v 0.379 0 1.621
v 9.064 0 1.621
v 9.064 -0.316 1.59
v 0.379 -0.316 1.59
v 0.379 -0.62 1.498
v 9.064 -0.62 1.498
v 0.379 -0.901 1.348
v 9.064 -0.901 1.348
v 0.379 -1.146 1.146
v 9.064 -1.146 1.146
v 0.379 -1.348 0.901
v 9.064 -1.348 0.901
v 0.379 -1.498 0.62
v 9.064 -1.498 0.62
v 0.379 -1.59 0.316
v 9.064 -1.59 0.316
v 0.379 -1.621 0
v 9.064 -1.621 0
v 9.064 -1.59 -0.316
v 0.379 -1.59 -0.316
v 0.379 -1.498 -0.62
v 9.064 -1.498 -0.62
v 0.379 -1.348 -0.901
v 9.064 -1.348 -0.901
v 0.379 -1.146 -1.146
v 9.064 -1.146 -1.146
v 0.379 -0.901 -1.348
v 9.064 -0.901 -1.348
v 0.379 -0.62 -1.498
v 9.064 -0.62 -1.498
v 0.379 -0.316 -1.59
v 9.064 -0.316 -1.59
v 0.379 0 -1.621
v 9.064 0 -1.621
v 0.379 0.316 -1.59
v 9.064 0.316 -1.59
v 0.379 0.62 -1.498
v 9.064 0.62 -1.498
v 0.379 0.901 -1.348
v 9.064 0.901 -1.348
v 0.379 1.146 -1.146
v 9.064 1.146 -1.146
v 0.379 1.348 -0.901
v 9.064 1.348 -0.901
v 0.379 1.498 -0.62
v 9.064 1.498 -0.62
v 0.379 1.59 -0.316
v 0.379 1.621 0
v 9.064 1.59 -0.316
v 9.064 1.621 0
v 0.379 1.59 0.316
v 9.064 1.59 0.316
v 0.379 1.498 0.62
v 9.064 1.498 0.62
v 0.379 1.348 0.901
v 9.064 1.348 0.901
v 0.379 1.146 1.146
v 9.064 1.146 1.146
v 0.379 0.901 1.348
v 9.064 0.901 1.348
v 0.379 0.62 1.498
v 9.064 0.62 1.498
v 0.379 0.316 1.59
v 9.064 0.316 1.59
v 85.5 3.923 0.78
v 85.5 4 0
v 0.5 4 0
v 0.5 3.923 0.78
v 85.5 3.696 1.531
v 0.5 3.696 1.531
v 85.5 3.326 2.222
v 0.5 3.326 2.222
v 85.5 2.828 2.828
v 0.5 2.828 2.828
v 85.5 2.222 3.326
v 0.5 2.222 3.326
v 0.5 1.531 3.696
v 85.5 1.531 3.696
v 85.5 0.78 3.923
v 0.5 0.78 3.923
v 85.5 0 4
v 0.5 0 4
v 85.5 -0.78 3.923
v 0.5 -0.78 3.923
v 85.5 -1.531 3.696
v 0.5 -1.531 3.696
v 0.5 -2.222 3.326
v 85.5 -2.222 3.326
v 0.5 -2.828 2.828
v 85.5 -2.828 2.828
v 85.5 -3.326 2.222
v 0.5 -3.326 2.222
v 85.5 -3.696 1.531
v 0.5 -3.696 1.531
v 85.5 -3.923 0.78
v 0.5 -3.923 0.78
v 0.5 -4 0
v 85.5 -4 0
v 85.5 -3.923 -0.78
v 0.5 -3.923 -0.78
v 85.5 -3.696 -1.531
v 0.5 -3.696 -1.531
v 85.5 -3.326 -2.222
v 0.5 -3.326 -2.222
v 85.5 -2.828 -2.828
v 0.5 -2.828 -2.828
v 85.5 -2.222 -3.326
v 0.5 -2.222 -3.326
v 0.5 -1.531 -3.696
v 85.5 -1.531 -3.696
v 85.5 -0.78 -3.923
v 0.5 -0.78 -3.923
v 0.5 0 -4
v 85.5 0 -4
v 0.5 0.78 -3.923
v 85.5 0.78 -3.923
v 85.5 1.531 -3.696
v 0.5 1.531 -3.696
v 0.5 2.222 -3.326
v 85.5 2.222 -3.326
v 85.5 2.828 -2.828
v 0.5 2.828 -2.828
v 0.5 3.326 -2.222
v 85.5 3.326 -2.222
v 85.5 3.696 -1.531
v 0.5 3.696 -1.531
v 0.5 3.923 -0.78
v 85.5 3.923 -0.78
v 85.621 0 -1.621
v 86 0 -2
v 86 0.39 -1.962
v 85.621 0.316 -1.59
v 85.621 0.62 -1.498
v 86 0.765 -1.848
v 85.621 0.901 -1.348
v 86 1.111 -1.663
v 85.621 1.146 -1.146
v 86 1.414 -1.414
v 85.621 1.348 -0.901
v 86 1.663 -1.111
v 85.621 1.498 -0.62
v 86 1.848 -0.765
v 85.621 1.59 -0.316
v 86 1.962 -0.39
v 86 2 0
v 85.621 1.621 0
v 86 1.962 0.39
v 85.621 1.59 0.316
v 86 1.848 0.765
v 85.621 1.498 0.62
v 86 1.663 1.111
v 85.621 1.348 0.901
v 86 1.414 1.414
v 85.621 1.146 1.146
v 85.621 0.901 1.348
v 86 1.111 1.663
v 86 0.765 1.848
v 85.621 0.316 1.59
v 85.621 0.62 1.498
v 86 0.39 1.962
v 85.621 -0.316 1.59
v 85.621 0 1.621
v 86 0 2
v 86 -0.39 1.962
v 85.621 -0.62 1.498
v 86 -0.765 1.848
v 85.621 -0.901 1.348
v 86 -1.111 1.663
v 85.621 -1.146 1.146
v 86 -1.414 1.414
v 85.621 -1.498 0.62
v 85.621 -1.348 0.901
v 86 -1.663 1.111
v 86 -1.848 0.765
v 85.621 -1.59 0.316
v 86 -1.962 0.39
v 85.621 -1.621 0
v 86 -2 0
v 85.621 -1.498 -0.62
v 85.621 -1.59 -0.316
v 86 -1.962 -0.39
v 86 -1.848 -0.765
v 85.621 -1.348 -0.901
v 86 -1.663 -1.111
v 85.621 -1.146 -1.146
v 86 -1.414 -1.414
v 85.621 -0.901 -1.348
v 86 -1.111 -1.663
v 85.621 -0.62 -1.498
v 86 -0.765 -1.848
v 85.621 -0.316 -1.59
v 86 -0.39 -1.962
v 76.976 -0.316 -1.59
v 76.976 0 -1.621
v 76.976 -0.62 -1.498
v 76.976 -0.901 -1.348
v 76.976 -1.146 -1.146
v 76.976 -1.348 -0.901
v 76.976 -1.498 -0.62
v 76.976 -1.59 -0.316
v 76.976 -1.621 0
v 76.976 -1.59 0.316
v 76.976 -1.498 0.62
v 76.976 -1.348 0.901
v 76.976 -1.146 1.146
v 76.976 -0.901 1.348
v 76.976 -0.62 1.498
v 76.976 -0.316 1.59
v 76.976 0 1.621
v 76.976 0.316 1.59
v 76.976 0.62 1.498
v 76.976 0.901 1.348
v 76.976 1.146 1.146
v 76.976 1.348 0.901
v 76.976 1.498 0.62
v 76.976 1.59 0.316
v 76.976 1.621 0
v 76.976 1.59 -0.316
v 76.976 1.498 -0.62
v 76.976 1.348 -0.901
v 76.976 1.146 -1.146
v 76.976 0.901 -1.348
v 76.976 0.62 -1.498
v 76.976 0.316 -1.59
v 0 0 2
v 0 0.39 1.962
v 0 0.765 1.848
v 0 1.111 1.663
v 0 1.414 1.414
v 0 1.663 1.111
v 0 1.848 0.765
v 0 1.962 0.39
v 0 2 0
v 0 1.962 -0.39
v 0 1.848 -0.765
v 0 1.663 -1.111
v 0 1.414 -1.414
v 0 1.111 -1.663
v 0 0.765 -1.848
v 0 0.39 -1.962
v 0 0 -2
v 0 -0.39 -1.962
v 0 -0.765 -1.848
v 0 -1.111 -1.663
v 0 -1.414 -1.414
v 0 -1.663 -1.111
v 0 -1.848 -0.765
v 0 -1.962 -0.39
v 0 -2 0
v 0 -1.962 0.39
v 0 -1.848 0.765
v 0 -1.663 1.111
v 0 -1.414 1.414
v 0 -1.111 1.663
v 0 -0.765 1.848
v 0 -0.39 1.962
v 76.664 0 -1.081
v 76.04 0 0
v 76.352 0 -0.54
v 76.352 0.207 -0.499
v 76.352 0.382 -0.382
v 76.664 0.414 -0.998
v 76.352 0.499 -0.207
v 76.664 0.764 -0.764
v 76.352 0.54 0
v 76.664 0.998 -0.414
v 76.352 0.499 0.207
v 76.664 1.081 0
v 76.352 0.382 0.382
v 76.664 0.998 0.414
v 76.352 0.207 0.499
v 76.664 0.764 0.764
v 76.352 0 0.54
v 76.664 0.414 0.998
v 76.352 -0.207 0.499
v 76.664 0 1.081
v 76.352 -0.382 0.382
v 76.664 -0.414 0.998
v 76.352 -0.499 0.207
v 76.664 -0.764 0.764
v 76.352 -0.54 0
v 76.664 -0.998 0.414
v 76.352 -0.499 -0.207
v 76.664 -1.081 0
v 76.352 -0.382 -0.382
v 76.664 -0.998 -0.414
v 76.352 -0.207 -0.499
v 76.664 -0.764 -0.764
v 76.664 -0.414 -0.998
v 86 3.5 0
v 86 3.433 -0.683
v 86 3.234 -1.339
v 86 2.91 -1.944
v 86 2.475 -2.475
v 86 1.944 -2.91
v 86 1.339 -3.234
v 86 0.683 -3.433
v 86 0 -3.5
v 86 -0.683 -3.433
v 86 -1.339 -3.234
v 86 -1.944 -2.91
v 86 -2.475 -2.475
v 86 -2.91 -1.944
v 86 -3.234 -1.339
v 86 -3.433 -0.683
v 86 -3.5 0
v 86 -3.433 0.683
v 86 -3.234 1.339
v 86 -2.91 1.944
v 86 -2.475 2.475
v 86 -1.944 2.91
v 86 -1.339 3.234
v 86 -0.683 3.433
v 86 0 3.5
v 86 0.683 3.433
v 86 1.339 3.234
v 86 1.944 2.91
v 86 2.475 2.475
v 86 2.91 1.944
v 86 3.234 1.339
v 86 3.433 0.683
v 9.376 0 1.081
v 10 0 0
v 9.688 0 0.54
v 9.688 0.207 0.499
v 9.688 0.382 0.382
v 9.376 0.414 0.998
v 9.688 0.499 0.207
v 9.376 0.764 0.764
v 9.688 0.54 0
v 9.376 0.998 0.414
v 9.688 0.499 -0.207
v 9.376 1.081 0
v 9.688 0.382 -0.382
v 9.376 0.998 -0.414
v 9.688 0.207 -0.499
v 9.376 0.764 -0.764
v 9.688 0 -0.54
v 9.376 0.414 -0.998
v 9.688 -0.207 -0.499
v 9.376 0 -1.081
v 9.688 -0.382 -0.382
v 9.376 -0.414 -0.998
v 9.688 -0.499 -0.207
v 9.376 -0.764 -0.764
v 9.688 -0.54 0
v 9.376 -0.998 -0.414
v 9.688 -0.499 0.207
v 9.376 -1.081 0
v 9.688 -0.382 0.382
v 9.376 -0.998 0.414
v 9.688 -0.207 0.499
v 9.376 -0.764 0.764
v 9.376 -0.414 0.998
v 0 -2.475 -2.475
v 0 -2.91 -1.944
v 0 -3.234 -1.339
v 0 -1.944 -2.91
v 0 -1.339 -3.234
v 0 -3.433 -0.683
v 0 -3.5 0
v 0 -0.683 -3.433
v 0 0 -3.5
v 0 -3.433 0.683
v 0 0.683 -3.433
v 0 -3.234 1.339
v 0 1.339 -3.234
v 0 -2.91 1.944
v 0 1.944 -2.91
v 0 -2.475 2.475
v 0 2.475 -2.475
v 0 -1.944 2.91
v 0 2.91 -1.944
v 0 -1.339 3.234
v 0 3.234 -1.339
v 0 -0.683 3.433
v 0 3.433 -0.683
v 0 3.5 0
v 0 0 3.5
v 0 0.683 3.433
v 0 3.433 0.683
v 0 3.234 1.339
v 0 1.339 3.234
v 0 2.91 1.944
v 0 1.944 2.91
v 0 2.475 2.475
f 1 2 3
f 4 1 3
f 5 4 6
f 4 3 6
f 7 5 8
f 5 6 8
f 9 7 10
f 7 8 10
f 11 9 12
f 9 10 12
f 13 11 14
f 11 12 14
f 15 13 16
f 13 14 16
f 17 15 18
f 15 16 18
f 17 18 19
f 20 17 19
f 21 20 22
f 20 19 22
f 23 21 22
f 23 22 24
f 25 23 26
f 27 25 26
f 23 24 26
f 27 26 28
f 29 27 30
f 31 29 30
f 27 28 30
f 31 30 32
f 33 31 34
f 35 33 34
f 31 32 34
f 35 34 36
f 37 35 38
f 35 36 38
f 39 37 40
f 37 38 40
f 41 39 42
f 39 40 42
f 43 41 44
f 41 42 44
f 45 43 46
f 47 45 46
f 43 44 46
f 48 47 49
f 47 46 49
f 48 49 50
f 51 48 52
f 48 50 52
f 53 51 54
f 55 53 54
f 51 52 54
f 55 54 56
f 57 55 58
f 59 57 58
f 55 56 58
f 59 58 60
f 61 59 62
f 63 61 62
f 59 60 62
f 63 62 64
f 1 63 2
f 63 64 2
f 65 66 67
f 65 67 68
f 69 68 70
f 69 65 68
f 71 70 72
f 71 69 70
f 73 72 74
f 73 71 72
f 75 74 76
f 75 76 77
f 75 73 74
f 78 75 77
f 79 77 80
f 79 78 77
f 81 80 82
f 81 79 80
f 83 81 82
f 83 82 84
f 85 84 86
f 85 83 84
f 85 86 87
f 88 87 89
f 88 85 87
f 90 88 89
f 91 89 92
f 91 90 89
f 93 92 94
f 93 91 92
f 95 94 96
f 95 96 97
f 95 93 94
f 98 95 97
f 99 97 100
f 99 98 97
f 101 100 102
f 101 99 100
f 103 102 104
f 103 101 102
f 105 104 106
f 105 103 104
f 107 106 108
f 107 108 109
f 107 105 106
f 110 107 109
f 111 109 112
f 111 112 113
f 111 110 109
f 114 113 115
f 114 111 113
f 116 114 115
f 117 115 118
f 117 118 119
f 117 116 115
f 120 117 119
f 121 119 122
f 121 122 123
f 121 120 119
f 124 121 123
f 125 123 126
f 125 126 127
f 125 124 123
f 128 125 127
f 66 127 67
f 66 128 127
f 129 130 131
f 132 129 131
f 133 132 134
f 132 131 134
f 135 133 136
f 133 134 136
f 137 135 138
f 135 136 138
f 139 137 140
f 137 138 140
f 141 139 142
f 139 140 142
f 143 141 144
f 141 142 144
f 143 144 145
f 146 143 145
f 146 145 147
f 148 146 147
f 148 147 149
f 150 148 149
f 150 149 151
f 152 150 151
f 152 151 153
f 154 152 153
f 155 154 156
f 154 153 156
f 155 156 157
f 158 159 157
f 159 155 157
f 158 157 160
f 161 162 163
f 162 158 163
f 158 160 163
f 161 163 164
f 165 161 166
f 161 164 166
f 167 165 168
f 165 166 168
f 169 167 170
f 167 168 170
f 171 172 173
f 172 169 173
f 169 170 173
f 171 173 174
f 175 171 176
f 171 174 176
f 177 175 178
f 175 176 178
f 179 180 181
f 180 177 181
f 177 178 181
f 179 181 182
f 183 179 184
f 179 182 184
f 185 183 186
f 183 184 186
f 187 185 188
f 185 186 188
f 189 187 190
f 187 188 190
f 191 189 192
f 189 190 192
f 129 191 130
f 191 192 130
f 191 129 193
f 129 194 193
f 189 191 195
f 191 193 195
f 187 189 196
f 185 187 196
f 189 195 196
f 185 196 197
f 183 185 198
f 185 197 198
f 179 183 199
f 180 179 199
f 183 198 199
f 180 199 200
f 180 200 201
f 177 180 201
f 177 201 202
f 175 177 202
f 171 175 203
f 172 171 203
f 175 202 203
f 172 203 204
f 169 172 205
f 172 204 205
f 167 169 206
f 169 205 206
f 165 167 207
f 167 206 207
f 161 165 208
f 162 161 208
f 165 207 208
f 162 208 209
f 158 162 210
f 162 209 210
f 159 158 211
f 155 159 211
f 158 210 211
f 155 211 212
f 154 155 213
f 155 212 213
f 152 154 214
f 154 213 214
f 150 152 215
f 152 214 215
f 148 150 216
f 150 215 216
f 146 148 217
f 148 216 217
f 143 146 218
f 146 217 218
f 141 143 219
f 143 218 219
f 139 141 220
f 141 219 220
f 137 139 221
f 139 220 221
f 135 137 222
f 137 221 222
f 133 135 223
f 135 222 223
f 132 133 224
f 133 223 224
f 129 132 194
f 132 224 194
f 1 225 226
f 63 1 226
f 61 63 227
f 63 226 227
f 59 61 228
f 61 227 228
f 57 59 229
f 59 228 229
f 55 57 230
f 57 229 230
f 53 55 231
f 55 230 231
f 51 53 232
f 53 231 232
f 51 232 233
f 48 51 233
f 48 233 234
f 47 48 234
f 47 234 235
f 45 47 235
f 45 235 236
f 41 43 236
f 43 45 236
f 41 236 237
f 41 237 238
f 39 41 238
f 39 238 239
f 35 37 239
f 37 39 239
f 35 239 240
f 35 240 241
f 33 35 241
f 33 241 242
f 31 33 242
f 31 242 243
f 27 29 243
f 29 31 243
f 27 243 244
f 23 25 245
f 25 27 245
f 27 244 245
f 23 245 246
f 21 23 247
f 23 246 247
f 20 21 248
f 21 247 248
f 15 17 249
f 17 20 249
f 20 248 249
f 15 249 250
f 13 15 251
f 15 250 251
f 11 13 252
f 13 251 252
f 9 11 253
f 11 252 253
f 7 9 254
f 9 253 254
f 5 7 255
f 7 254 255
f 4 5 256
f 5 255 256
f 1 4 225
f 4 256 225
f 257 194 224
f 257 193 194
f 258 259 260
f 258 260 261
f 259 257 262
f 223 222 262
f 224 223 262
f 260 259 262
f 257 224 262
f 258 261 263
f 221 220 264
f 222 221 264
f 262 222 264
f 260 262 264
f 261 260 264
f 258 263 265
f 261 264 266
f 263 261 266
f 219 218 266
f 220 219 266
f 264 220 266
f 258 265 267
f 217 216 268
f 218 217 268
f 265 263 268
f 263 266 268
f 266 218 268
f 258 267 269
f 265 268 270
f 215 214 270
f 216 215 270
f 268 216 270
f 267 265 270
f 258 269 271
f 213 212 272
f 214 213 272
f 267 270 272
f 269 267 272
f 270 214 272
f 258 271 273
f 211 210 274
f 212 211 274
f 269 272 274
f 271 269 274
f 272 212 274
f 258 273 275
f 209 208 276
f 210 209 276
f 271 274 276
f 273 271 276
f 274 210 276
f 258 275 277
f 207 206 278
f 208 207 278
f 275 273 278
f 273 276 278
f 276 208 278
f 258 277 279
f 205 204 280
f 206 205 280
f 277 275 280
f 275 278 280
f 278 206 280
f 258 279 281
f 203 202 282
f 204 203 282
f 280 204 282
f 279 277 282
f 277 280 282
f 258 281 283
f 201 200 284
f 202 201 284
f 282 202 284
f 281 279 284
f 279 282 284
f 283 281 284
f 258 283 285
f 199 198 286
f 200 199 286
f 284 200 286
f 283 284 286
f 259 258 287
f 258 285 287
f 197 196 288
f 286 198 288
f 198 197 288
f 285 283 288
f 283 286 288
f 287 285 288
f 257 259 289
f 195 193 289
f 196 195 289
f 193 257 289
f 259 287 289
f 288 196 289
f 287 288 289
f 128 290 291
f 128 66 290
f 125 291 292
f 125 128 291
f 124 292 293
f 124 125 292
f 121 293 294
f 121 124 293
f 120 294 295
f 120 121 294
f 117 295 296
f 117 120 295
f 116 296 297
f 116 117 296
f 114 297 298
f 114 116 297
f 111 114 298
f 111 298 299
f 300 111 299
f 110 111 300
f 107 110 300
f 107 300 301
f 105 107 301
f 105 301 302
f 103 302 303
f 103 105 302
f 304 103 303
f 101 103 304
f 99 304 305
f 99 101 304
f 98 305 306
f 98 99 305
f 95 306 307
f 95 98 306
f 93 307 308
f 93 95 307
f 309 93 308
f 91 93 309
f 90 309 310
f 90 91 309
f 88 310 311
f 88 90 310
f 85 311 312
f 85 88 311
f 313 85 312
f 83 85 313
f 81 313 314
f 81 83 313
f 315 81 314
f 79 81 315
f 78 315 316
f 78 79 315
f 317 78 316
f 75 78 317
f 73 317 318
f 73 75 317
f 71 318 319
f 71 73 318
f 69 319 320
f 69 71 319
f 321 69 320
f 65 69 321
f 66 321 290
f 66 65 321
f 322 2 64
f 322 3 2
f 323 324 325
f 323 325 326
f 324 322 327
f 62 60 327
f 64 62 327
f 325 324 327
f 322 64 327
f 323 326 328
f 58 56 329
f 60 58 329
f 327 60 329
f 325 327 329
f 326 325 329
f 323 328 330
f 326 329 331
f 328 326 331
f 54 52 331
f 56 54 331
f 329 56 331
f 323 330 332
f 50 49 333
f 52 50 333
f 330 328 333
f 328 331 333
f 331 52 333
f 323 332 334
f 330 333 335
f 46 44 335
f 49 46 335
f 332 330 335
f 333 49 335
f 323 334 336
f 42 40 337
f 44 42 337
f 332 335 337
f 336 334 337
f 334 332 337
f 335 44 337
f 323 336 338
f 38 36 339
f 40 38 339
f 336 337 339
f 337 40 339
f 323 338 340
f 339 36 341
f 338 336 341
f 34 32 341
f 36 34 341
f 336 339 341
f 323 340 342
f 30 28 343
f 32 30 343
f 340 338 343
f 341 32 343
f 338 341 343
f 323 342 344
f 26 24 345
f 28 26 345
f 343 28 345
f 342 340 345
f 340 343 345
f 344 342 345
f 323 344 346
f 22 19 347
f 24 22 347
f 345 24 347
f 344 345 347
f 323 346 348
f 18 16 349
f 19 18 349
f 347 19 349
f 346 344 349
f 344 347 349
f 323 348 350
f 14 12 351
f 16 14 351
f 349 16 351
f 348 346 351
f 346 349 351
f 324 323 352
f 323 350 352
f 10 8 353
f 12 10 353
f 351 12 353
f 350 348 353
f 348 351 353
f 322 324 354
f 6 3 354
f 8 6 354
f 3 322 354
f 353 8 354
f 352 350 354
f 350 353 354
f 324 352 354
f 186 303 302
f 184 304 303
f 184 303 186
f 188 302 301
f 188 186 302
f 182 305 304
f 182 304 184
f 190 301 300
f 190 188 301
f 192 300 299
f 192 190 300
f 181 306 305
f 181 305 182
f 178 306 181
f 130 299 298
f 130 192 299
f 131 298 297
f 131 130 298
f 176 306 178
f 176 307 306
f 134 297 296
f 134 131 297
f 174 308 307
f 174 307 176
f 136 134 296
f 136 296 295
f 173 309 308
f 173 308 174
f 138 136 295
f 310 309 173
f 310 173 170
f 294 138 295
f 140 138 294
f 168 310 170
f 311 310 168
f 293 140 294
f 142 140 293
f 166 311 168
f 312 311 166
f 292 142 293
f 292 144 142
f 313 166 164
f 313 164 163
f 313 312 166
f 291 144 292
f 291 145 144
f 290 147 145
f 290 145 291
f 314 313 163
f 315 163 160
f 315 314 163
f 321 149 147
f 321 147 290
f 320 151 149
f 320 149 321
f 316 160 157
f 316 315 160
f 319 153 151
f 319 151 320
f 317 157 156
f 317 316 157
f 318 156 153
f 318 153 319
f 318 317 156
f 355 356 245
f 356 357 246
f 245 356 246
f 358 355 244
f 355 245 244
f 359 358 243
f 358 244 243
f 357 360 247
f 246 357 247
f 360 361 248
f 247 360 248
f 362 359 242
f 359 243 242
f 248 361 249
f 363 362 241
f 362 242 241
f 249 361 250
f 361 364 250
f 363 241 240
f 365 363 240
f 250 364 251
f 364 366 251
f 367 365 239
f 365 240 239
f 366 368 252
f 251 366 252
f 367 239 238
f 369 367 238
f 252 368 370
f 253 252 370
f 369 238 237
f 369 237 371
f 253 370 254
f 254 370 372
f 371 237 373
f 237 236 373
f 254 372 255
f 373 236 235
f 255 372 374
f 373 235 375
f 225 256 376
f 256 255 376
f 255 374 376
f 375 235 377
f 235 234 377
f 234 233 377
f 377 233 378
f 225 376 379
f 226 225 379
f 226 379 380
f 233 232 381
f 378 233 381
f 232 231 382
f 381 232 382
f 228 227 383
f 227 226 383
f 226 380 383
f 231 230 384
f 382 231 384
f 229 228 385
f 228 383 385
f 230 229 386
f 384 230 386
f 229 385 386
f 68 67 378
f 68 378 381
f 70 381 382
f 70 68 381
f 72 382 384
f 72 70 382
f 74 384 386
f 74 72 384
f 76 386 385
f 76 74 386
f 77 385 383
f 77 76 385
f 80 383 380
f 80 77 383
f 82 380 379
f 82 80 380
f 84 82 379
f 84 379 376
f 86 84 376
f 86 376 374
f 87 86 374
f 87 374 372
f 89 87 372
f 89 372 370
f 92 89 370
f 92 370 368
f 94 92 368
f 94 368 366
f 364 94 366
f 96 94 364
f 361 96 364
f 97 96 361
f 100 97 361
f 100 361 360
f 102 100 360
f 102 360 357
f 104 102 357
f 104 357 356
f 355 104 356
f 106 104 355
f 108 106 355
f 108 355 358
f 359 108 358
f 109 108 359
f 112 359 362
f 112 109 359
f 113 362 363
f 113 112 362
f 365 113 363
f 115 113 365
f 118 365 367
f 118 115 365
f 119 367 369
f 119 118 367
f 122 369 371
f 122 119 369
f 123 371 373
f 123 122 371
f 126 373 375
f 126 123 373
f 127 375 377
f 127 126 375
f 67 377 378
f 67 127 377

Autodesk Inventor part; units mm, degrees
ref_plane "YZ Plane" through (0, 0, 0) normal (1, 0, 0) x (0, 1, 0)
ref_plane "XZ Plane" through (0, 0, 0) normal (0, 1, 0) x (-1, 0, 0)
ref_plane "XY Plane" through (0, 0, 0) normal (0, 0, 1) x (1, 0, 0)
sketch "Sketch_1" plane through (0, 0, 0) normal (0, 0, 1) x (1, 0, 0)
  line L0 (86, 0) -> (0, 0)
  line L1 (0, 0) -> (0, 3.5)
  line L2 (0, 3.5) -> (0.5, 4)
  line L3 (0.5, 4) -> (85.5, 4)
  line L4 (85.5, 4) -> (86, 3.5)
  line L5 (86, 3.5) -> (86, 0)
  line L6 (86, 0) -> (0, 0)
revolve "Revolution1" add sketch "Sketch_1" angle 360 about axis through (86, 0, 0) along (1, 0, 0)
sketch "Sketch2" plane through (0, 0, 0) normal (-1, 0, 0) x (0, 0, 1)
  point P0 (0, 0)
hole "Hole1" at (0, 0, 0) direction (1, 0, 0) diameter 3.242 depth 9.0641 tip angle 120 countersink diameter 4 countersink angle 90 thread size "M4x0.7" class "6H" standard "ISO Metric profile"
sketch "Sketch3" plane through (86, 0, 0) normal (1, 0, 0) x (0, 0, -1)
  point P0 (0, 0)
hole "Hole2" at (86, 0, 0) direction (-1, 0, 0) diameter 3.242 depth 9.0241 tip angle 120 countersink diameter 4 countersink angle 90 thread size "M4x0.7" class "6H" standard "ISO Metric profile"
properties part number "RDOB8-86-WMC4"
